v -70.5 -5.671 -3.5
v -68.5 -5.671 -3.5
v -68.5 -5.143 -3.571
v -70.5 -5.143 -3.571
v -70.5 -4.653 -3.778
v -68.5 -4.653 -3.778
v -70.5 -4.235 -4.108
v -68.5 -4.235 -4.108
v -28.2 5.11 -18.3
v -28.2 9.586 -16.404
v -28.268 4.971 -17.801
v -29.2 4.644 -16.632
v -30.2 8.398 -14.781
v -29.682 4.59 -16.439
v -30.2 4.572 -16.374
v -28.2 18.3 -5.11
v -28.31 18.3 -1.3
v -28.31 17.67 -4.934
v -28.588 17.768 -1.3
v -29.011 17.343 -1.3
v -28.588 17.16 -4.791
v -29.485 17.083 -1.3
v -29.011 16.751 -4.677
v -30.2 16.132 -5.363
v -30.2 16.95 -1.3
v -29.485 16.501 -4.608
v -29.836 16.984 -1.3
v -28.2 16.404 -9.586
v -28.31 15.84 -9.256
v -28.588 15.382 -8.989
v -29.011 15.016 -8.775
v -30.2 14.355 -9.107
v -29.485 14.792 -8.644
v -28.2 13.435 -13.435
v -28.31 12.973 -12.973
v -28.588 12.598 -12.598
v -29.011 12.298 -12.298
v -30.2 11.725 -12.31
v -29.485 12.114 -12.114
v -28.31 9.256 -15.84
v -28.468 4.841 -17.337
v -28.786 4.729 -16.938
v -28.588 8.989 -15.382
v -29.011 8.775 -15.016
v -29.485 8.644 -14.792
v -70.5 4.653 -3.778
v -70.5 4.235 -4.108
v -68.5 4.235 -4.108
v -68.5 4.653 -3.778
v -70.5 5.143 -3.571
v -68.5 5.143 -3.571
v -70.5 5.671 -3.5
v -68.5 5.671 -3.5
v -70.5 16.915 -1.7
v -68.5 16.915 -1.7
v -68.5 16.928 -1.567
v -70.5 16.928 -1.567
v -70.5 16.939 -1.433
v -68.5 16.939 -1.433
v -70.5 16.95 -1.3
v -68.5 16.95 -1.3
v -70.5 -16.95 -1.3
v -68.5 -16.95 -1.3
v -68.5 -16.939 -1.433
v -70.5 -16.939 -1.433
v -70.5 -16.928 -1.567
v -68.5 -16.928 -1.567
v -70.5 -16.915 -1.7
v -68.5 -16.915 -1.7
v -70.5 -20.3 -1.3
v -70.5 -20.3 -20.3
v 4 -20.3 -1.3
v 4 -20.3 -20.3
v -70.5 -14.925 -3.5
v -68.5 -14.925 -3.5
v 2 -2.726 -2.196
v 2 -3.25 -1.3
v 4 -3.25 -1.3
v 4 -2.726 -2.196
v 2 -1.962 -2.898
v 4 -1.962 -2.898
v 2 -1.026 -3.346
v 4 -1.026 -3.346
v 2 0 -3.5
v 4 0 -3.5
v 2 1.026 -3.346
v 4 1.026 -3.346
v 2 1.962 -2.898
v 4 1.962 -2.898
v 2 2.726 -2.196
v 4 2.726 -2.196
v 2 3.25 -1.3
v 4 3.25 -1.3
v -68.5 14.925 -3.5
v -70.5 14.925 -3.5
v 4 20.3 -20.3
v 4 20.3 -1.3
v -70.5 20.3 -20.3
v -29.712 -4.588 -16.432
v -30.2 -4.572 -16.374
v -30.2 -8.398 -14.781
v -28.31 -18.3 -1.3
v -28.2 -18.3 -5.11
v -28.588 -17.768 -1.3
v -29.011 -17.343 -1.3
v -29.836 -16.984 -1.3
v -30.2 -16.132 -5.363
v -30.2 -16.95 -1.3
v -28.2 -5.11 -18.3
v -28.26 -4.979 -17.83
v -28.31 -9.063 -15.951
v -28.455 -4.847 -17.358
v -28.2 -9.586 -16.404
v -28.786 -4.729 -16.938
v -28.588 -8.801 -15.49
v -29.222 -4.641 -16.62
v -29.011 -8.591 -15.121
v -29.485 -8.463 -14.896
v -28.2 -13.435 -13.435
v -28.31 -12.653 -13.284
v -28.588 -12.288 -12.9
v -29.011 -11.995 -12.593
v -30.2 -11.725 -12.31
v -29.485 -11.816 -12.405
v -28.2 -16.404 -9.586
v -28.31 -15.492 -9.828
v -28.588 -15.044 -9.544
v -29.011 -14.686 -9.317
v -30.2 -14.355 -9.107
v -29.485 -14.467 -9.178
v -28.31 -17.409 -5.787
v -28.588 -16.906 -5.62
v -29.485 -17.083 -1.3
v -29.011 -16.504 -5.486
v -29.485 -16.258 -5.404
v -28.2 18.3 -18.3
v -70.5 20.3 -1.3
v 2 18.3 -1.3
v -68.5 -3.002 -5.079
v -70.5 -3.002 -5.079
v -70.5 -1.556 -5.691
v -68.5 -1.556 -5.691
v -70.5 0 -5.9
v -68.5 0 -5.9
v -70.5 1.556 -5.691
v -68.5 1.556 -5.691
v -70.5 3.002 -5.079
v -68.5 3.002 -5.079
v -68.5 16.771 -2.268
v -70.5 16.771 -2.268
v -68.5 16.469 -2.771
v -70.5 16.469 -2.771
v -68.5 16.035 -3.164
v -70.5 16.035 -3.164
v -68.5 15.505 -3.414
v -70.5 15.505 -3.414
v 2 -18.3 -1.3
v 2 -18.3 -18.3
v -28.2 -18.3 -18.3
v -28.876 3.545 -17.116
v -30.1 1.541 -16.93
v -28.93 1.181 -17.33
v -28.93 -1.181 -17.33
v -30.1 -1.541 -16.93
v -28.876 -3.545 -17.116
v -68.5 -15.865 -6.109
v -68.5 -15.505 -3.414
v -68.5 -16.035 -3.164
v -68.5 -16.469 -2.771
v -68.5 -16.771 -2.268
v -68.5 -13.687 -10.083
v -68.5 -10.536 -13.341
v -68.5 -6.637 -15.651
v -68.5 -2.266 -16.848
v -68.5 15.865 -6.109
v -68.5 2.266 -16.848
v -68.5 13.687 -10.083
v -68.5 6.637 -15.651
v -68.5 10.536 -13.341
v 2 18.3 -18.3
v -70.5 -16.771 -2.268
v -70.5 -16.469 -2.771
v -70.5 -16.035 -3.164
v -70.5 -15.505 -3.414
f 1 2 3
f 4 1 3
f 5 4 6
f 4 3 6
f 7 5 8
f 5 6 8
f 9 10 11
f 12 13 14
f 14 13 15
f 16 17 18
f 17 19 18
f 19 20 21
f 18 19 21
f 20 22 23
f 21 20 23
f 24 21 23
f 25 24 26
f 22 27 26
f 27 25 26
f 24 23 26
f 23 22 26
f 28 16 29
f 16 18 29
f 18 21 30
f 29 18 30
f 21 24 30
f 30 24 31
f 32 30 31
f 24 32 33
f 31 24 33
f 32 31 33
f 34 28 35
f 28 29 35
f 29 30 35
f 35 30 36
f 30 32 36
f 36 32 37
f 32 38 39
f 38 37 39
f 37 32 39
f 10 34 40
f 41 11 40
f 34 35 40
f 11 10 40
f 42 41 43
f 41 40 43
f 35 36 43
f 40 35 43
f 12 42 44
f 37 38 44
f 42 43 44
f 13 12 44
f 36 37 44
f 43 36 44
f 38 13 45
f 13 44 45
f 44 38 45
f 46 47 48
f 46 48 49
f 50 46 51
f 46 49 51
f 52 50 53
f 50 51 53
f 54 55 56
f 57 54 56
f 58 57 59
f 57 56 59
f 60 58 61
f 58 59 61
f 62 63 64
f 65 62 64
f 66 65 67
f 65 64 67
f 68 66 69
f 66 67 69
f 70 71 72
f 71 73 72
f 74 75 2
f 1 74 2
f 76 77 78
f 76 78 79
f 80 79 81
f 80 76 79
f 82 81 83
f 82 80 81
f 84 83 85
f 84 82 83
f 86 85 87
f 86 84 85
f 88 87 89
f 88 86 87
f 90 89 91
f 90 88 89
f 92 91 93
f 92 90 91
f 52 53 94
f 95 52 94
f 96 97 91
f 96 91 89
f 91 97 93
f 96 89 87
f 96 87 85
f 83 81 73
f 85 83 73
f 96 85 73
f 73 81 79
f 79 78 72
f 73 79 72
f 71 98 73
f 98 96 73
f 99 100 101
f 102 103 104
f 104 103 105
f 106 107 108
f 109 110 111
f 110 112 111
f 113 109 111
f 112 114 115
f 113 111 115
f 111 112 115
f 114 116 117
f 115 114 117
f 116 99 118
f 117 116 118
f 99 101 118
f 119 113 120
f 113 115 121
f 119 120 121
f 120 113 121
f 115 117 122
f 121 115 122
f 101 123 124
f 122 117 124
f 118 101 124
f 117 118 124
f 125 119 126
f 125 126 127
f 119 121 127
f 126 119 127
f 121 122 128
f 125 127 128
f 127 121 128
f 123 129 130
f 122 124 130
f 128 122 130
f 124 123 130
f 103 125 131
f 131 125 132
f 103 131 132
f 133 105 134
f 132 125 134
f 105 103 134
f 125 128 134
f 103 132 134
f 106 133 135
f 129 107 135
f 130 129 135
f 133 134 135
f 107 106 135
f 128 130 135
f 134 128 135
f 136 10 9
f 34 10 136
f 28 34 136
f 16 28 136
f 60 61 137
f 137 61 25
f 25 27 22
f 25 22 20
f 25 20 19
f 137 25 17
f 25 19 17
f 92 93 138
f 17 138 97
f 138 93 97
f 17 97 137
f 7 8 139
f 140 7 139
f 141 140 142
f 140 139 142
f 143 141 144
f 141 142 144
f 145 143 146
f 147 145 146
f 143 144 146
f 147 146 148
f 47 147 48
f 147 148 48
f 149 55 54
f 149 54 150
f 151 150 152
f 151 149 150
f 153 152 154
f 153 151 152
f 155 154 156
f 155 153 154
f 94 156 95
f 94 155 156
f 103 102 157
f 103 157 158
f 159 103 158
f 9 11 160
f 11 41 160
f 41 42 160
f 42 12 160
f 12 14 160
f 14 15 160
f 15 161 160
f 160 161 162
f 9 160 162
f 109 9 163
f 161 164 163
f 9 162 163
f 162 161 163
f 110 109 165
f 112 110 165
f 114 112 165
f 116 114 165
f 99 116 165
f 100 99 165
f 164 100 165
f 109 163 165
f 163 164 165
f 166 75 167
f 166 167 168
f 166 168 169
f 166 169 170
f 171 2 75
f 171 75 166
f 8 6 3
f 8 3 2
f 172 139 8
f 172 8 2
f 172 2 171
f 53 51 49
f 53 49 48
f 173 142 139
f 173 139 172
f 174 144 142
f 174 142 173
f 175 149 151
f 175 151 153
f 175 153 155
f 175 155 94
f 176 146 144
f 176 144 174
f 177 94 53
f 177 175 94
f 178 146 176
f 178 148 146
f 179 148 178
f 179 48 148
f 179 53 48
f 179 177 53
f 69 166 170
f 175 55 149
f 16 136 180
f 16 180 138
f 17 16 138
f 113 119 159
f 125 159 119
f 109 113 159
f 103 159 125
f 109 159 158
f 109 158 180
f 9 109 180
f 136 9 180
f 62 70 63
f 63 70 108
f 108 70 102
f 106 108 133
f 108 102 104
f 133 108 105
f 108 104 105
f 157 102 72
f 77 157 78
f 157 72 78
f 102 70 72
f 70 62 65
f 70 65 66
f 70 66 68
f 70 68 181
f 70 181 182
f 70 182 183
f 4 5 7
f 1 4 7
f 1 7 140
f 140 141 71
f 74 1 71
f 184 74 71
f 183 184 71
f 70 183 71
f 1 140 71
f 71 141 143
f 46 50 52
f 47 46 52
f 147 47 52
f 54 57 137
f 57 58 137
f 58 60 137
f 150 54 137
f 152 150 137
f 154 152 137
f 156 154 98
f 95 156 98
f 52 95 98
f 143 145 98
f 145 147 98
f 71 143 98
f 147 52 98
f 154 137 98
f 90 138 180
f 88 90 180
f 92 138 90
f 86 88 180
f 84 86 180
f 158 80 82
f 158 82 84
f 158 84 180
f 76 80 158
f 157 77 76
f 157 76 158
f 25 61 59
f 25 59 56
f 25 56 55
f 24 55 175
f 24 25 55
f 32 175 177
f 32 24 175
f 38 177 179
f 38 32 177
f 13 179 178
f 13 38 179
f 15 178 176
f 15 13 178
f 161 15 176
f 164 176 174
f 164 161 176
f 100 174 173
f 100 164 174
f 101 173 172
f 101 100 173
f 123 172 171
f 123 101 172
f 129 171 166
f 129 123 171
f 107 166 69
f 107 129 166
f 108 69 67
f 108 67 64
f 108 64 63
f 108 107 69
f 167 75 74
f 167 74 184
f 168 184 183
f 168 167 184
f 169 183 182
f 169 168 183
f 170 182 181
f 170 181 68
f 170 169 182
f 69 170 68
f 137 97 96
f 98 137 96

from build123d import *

# Parameters (mm, degrees)
BOSS_EXTRUDE1_DEPTH      = 2
BOSS_EXTRUDE1_DEPTH_BACK = 28.2
BOSS_EXTRUDE2_DEPTH      = 40.3
BOSS_EXTRUDE3_DEPTH      = 2
BOSS_EXTRUDE4_DEPTH      = 2
FILLET1_R                = 2
FILLET2_R                = 2


with BuildPart() as part:
    # Sketch1 → Boss-Extrude1 (new, two sides: drawn at the far end of the back side and taken through both)
    with BuildSketch(Plane.YZ.offset(-BOSS_EXTRUDE1_DEPTH_BACK)):
        Polygon((-18.3, -1.3), (-18.3, -18.3), (18.3, -18.3), (18.3, -1.3), (20.3, -1.3), (20.3, -20.3), (-20.3, -20.3), (-20.3, -1.3), align=None)
    extrude(amount=BOSS_EXTRUDE1_DEPTH + BOSS_EXTRUDE1_DEPTH_BACK)

    # Sketch2 → Boss-Extrude2 (add)
    with BuildSketch(Plane(origin=(-28.2, 0, 0), x_dir=(0, -1, 0), z_dir=(-1, 0, 0))):
        with BuildLine():
            Line((-18.3, -1.3), (-16.950221237, -1.3))
            ThreePointArc((-16.950221237, -1.3), (0, -17), (16.950221237, -1.3))
            Line((16.950221237, -1.3), (18.3, -1.3))
            Line((18.3, -1.3), (20.3, -1.3))
            Line((20.3, -1.3), (20.3, -20.3))
            Line((20.3, -20.3), (-20.3, -20.3))
            Line((-20.3, -20.3), (-20.3, -1.3))
            Line((-20.3, -1.3), (-18.3, -1.3))
        make_face()
    extrude(amount=BOSS_EXTRUDE2_DEPTH)

    # Sketch3 → Boss-Extrude3 (add)
    with BuildSketch(Plane.YZ.offset(2)):
        with BuildLine():
            Line((3.249615362, -1.3), (20.3, -1.3))
            Line((20.3, -1.3), (20.3, -20.3))
            Line((20.3, -20.3), (-20.3, -20.3))
            Line((-20.3, -20.3), (-20.3, -1.3))
            Line((-20.3, -1.3), (-3.249615362, -1.3))
            ThreePointArc((-3.249615362, -1.3), (0, -3.5), (3.249615362, -1.3))
        make_face()
    extrude(amount=BOSS_EXTRUDE3_DEPTH)

    # Sketch4 → Boss-Extrude4 (add)
    with BuildSketch(Plane(origin=(-68.5, 0, 0), x_dir=(0, -1, 0), z_dir=(-1, 0, 0))):
        with BuildLine():
            Line((-20.3, -1.3), (-20.3, -20.3))
            Line((-20.3, -20.3), (20.3, -20.3))
            Line((20.3, -20.3), (20.3, -1.3))
            Line((20.3, -1.3), (16.950221237, -1.3))
            ThreePointArc((16.950221237, -1.3), (16.829001324, -2.405143328), (16.63580476, -3.5))
            Line((16.63580476, -3.5), (4.749736835, -3.5))
            ThreePointArc((4.749736835, -3.5), (0, -5.9), (-4.749736835, -3.5))
            Line((-4.749736835, -3.5), (-16.63580476, -3.5))
            ThreePointArc((-16.63580476, -3.5), (-16.829001324, -2.405143328), (-16.950221237, -1.3))
            Line((-16.950221237, -1.3), (-20.3, -1.3))
        make_face()
    extrude(amount=BOSS_EXTRUDE4_DEPTH)

    # Fillet1
    fillet1_edges = [part.edges().sort_by_distance(p)[0] for p in [
        (-28.2, 0, -17),
    ]]
    fillet(fillet1_edges, radius=FILLET1_R)

    # Fillet2
    # the kernel refuses this fillet: 2 mm, written as the material it adds along each edge
    with BuildSketch(Plane(origin=(-68.5, -16.63580476, -3.5), x_dir=(0, -0.15316112796135575, 0.9882012289415578), z_dir=(-1, 0, 0))) as fillet2_piece_1:
        with BuildLine():
            CenterArc((1.714344809, 1.997127842), FILLET2_R, 188.810163249, 84.260829523)
            Line((-0.262057649, 1.690805586), (0, 0))
            ThreePointArc((0, 0), (0.91074568, -0.024413344), (1.82149136, 0))
        make_face()
    extrude(amount=2)
    with BuildSketch(Plane(origin=(-68.5, 16.63580476, -3.5), x_dir=(0, 0.15316112796135792, 0.9882012289415576), z_dir=(-1, 0, 0))) as fillet2_piece_2:
        with BuildLine():
            CenterArc((1.714344809, -1.997127842), FILLET2_R, 86.929007228, 84.260829523)
            Line((-0.262057649, -1.690805586), (0, 0))
            ThreePointArc((0, 0), (0.91074568, 0.024413344), (1.82149136, 0))
        make_face()
    extrude(amount=2)
    # the kernel refuses this fillet: 2 mm, written as the material it takes off along each edge
    with BuildSketch(Plane(origin=(-66.196895208, -4.749736835, -3.5), x_dir=(0, 0.6461838477214604, -0.7631817836819014), z_dir=(-1, 0, 0))) as fillet2_2_piece_1:
        with BuildLine():
            CenterArc((0.931071921, 1.995442745), FILLET2_R, 220.254494439, 45.876878938)
            Line((-0.595291646, 0.703075049), (0, 0))
            ThreePointArc((0, 0), (0.398066981, 0.013443903), (0.796133961, 0))
        make_face()
    extrude(amount=6.606209583, mode=Mode.SUBTRACT)
    with BuildSketch(Plane(origin=(-66.196895208, 4.749736835, -3.5), x_dir=(0, 1, 0), z_dir=(-1, 0, 0))) as fillet2_2_piece_2:
        with BuildLine():
            CenterArc((0.921241917, 2), FILLET2_R, 224.123121062, 45.876878938)
            ThreePointArc((-0.514448906, 0.607594937), (-0.246964311, 0.312484702), (0, 0))
            Line((0, 0), (0.921241917, 0))
        make_face()
    extrude(amount=6.606209583, mode=Mode.SUBTRACT)


solid = part.part
